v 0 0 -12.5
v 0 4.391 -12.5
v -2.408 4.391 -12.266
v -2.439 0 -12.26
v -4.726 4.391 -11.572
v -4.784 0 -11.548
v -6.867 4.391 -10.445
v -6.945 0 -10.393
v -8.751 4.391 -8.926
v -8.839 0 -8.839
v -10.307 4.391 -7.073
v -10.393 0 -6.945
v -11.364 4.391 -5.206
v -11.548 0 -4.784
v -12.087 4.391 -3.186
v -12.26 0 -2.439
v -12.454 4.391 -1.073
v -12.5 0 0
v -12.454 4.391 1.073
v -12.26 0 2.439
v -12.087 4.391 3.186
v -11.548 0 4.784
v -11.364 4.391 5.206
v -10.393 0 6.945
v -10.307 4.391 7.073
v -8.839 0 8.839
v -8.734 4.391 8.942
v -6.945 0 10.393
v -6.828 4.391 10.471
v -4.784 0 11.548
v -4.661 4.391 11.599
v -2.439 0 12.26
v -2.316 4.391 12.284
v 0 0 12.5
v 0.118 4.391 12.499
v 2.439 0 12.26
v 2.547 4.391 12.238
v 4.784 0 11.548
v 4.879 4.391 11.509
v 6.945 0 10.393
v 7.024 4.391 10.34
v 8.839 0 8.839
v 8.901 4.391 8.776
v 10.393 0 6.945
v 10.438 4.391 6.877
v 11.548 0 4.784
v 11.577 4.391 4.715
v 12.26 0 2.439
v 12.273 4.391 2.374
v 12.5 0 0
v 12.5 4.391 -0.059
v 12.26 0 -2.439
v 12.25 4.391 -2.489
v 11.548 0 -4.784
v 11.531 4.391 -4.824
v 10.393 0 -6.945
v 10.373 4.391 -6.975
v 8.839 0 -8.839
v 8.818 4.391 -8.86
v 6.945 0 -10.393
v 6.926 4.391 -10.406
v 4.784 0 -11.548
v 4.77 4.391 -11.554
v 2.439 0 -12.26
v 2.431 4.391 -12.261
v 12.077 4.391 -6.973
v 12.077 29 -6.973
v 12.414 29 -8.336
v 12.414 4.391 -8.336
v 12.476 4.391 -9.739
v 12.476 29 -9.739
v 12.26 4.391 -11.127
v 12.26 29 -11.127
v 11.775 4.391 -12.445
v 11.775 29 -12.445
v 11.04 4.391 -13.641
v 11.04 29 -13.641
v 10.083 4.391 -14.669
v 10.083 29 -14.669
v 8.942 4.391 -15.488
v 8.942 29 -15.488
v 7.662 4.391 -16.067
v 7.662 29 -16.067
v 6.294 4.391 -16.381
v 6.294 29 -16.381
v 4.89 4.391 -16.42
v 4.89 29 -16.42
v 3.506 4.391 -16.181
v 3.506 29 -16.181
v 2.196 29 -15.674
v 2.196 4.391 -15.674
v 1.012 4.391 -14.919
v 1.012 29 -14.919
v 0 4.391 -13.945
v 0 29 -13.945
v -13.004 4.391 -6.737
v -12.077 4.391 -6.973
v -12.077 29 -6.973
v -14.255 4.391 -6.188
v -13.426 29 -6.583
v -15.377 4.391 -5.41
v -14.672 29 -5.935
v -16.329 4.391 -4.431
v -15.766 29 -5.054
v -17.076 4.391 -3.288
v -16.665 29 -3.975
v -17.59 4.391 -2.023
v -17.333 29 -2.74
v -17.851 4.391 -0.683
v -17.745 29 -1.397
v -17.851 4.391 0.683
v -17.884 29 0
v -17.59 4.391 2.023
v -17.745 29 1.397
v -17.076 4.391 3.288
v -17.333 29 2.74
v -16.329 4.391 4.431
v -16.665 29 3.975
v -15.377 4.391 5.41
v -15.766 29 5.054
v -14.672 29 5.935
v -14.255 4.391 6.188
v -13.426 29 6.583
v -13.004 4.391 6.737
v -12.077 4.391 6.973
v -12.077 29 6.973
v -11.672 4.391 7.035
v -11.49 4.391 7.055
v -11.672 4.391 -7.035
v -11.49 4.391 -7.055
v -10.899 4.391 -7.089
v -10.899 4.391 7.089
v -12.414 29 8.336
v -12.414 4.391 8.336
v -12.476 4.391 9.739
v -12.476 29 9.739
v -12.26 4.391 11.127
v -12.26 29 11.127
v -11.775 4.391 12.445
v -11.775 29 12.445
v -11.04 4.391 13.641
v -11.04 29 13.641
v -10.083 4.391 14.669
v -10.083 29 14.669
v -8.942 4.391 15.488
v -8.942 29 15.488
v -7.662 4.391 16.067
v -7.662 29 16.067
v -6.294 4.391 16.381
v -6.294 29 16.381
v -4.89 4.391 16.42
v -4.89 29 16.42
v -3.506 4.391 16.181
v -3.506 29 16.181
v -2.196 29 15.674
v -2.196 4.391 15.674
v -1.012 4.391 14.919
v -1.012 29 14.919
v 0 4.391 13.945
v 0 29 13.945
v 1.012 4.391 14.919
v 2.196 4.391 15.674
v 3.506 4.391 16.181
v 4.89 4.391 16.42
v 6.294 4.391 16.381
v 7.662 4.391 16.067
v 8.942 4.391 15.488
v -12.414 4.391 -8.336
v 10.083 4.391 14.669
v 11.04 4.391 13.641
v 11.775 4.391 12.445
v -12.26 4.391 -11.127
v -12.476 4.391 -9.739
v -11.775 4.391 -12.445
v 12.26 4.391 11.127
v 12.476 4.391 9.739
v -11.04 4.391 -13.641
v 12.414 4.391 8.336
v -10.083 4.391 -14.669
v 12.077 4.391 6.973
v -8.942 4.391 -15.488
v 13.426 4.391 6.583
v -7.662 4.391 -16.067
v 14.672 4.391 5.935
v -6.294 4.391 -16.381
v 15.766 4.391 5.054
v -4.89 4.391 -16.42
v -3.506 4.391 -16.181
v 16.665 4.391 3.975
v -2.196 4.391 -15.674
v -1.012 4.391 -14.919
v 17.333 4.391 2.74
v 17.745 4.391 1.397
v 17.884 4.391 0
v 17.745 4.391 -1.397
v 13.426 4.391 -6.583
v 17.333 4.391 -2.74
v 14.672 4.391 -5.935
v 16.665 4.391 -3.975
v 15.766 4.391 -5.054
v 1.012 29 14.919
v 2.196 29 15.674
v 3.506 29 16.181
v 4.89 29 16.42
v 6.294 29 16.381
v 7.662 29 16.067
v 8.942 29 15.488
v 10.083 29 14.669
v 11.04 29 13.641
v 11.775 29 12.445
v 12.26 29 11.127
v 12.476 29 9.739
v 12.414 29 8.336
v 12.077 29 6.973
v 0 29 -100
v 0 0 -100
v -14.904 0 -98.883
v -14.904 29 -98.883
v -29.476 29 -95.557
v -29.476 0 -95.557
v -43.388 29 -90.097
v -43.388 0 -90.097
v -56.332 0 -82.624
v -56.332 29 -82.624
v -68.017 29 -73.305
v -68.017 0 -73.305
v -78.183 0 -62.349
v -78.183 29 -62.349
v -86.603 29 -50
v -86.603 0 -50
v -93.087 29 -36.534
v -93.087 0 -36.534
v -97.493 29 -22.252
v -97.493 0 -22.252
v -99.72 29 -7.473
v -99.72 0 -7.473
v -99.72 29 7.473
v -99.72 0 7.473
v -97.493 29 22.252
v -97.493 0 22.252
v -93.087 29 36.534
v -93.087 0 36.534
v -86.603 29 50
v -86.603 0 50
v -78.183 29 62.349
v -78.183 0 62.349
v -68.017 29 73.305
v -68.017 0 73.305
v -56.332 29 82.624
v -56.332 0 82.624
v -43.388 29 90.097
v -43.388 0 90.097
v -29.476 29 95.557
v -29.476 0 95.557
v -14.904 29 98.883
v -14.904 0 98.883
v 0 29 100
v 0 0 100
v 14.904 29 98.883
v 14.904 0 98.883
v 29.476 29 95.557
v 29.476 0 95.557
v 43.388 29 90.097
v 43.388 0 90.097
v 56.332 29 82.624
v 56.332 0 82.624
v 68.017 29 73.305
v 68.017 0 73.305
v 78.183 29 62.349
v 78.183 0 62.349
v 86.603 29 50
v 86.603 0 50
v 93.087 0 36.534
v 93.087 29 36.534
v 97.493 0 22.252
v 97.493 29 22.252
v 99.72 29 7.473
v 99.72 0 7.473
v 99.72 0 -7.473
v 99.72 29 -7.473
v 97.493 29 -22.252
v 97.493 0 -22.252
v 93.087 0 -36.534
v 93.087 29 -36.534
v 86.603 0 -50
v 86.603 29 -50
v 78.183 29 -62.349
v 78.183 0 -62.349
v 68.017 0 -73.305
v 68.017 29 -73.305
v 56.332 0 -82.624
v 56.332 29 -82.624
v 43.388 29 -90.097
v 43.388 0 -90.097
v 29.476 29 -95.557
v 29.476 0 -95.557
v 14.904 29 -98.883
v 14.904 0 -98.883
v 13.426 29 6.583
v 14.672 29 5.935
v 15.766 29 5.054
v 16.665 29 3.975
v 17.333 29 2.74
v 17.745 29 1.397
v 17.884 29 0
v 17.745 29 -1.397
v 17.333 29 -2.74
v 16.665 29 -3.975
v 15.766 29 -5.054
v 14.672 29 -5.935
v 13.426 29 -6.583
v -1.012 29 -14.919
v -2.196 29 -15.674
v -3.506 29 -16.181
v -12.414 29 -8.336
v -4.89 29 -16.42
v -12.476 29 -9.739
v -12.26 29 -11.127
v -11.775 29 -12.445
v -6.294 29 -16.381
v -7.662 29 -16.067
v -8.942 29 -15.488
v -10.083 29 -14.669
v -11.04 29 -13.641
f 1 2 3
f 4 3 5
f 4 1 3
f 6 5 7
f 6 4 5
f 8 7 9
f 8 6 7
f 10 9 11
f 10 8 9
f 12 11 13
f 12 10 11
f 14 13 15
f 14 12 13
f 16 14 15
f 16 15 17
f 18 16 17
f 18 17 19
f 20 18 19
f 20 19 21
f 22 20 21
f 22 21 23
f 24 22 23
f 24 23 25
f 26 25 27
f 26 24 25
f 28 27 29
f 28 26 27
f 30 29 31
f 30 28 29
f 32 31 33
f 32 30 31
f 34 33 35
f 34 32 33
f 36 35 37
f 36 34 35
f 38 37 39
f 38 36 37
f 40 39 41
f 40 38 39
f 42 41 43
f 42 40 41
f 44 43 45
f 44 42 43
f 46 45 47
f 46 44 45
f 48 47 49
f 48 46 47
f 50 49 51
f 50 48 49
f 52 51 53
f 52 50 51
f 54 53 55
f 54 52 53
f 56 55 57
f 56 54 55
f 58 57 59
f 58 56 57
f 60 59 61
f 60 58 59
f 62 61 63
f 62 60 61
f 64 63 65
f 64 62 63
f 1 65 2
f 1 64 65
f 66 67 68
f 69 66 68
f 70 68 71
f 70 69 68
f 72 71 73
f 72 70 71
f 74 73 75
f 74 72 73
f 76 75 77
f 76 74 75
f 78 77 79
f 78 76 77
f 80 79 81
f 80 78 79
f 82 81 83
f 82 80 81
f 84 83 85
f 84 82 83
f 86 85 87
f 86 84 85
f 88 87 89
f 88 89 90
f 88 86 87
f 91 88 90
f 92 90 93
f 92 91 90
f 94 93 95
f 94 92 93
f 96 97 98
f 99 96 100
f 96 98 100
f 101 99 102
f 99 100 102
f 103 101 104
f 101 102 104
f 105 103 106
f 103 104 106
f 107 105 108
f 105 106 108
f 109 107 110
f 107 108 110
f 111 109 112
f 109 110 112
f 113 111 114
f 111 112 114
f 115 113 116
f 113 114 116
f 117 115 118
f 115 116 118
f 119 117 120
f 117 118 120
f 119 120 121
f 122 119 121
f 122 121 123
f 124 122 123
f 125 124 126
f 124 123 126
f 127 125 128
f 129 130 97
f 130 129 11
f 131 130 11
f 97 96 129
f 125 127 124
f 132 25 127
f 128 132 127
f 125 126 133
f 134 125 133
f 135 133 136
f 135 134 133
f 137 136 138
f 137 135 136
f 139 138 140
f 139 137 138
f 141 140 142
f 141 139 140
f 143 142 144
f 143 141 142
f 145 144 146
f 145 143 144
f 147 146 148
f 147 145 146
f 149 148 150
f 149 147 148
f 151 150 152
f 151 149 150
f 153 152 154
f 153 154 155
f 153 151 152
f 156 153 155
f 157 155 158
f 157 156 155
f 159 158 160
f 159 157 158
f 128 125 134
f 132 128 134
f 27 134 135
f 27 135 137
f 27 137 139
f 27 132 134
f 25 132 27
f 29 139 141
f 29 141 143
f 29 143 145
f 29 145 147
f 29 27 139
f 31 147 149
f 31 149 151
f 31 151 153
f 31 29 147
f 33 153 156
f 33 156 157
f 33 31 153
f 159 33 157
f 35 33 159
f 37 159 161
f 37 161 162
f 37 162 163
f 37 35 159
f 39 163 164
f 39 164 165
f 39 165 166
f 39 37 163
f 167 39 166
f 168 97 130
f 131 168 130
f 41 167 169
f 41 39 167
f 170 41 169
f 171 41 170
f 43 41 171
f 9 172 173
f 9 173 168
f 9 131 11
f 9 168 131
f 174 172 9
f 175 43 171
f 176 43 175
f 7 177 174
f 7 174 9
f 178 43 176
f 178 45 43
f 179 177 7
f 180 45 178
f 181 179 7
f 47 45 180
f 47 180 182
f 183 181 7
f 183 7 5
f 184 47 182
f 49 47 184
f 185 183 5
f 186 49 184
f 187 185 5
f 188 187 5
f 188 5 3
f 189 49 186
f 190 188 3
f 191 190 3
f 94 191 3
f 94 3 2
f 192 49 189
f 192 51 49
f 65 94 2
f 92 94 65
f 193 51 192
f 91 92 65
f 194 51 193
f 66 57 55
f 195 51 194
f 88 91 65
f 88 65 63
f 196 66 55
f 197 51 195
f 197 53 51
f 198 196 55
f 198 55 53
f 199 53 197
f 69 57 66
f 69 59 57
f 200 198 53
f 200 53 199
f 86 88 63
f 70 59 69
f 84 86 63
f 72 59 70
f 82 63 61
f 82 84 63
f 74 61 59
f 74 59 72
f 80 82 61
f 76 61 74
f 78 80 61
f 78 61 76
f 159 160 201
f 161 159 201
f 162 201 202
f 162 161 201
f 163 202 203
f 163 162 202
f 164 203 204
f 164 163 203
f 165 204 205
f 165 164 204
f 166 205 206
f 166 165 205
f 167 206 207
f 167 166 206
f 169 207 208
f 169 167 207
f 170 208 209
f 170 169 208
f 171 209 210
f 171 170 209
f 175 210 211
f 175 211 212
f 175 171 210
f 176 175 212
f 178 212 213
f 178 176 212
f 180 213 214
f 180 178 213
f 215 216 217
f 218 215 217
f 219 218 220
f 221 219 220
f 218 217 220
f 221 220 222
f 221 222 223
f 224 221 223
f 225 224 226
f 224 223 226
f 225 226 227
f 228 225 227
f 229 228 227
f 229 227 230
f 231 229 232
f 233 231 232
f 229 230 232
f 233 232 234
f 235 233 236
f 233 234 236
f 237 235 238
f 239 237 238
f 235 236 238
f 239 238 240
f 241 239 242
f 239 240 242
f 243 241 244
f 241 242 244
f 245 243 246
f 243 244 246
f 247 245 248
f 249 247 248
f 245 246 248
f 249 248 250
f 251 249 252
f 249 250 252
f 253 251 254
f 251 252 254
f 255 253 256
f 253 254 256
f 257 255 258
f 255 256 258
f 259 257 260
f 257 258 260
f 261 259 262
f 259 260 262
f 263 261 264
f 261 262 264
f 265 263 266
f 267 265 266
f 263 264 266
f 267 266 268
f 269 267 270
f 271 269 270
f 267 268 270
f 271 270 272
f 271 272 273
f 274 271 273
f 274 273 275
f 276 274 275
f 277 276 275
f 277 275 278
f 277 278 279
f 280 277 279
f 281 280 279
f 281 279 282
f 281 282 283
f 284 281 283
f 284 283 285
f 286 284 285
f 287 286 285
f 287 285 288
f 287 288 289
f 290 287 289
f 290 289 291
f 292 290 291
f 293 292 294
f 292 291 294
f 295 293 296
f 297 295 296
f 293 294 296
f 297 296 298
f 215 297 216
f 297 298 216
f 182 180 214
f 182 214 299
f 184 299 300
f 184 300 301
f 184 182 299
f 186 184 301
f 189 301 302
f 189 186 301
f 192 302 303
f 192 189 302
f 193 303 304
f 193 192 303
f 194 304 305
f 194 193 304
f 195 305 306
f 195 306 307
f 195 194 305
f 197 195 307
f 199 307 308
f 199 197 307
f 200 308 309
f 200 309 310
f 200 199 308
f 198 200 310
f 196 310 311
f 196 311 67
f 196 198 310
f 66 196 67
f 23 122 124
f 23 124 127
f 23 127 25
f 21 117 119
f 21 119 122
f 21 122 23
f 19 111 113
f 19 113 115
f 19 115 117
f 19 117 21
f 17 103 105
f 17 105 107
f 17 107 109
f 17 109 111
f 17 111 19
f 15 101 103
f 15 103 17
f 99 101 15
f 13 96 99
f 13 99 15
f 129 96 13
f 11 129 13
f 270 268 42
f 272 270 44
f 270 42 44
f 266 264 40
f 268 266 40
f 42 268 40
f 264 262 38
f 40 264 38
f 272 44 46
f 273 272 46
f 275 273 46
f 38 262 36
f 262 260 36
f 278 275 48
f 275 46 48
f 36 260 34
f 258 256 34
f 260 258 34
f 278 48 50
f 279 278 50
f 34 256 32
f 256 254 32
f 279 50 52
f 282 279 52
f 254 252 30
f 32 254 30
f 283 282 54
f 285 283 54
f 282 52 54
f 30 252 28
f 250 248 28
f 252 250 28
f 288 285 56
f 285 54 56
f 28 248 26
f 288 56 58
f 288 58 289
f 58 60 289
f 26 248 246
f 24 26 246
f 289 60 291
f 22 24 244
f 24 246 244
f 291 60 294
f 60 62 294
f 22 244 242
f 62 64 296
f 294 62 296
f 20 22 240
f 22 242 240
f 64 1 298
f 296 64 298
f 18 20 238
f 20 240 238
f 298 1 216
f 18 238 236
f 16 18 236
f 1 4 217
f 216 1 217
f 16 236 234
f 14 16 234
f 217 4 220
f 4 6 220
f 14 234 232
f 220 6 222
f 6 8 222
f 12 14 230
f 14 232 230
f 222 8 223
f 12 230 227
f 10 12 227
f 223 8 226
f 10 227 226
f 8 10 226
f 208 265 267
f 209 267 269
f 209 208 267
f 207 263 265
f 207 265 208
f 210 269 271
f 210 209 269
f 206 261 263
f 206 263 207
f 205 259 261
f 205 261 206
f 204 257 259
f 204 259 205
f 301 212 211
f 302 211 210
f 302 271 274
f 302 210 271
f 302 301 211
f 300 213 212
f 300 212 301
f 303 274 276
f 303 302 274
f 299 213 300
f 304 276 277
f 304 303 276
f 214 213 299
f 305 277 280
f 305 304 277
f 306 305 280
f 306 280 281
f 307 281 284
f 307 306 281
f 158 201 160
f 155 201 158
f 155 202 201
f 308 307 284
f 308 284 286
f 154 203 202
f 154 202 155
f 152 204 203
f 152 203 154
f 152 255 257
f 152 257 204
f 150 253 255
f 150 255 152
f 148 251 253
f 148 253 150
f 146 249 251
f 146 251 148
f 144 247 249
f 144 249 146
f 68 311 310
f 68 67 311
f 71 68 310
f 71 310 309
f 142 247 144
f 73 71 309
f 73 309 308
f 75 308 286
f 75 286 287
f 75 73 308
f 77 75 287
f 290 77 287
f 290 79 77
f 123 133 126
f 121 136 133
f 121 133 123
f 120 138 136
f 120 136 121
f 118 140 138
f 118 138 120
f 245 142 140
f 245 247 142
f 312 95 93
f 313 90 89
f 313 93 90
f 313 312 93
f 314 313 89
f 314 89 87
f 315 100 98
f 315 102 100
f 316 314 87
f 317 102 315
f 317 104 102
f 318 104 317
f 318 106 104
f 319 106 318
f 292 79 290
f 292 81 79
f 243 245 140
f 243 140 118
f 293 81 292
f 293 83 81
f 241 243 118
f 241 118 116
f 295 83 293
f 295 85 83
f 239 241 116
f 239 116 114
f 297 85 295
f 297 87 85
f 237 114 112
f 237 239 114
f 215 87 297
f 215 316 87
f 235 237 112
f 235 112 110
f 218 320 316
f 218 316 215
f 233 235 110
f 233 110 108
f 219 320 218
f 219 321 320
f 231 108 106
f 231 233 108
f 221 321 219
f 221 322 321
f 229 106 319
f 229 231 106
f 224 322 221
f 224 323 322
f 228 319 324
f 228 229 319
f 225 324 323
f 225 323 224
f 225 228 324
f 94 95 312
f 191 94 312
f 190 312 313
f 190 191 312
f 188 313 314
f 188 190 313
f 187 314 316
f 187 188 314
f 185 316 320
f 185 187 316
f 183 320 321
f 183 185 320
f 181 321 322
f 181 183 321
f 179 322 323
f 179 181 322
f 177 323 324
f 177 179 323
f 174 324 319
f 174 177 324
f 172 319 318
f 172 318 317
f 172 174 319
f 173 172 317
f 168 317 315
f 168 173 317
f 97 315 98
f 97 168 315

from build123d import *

# Parameters (mm, degrees)
SKETCH1_R           = 100
BOSS_EXTRUDE1_DEPTH = 29
SKETCH2_R           = 12.5
CUT_EXTRUDE1_DEPTH  = 145.364122967
SKETCH3_R           = 7.089633459
CUT_EXTRUDE2_DEPTH  = 24.608660531
CIRPATTERN1_COUNT   = 6


with BuildPart() as part:
    # Sketch1 → Boss-Extrude1 (new body)
    with BuildSketch(Plane(origin=(0, 0, 0), x_dir=(1, 0, 0), z_dir=(0, 1, 0))):
        Circle(SKETCH1_R)
    extrude(amount=BOSS_EXTRUDE1_DEPTH)

    # Sketch2 → Cut-Extrude1 (cut, through all)
    with BuildSketch(Plane(origin=(0, 0, 0), x_dir=(1, 0, 0), z_dir=(0, 1, 0))):
        Circle(SKETCH2_R)
    extrude(amount=CUT_EXTRUDE1_DEPTH, mode=Mode.SUBTRACT)

    # Sketch3 → Cut-Extrude2 (cut)
    with BuildSketch(Plane(origin=(0, 29, 0), x_dir=(1, 0, 0), z_dir=(0, 1, 0))):
        with Locations((-10.794655518, 0)):
            Circle(SKETCH3_R)
    cut_extrude2 = extrude(amount=-CUT_EXTRUDE2_DEPTH, mode=Mode.SUBTRACT)

    # CirPattern1: Cut-Extrude2 ×6 about axis
    cirpattern1_axis = Axis((0, 0, 0), (0, 1, 0))
    for i in range(1, CIRPATTERN1_COUNT):
        add(cut_extrude2.rotate(cirpattern1_axis, i * 360 / CIRPATTERN1_COUNT), mode=Mode.SUBTRACT)


solid = part.part
